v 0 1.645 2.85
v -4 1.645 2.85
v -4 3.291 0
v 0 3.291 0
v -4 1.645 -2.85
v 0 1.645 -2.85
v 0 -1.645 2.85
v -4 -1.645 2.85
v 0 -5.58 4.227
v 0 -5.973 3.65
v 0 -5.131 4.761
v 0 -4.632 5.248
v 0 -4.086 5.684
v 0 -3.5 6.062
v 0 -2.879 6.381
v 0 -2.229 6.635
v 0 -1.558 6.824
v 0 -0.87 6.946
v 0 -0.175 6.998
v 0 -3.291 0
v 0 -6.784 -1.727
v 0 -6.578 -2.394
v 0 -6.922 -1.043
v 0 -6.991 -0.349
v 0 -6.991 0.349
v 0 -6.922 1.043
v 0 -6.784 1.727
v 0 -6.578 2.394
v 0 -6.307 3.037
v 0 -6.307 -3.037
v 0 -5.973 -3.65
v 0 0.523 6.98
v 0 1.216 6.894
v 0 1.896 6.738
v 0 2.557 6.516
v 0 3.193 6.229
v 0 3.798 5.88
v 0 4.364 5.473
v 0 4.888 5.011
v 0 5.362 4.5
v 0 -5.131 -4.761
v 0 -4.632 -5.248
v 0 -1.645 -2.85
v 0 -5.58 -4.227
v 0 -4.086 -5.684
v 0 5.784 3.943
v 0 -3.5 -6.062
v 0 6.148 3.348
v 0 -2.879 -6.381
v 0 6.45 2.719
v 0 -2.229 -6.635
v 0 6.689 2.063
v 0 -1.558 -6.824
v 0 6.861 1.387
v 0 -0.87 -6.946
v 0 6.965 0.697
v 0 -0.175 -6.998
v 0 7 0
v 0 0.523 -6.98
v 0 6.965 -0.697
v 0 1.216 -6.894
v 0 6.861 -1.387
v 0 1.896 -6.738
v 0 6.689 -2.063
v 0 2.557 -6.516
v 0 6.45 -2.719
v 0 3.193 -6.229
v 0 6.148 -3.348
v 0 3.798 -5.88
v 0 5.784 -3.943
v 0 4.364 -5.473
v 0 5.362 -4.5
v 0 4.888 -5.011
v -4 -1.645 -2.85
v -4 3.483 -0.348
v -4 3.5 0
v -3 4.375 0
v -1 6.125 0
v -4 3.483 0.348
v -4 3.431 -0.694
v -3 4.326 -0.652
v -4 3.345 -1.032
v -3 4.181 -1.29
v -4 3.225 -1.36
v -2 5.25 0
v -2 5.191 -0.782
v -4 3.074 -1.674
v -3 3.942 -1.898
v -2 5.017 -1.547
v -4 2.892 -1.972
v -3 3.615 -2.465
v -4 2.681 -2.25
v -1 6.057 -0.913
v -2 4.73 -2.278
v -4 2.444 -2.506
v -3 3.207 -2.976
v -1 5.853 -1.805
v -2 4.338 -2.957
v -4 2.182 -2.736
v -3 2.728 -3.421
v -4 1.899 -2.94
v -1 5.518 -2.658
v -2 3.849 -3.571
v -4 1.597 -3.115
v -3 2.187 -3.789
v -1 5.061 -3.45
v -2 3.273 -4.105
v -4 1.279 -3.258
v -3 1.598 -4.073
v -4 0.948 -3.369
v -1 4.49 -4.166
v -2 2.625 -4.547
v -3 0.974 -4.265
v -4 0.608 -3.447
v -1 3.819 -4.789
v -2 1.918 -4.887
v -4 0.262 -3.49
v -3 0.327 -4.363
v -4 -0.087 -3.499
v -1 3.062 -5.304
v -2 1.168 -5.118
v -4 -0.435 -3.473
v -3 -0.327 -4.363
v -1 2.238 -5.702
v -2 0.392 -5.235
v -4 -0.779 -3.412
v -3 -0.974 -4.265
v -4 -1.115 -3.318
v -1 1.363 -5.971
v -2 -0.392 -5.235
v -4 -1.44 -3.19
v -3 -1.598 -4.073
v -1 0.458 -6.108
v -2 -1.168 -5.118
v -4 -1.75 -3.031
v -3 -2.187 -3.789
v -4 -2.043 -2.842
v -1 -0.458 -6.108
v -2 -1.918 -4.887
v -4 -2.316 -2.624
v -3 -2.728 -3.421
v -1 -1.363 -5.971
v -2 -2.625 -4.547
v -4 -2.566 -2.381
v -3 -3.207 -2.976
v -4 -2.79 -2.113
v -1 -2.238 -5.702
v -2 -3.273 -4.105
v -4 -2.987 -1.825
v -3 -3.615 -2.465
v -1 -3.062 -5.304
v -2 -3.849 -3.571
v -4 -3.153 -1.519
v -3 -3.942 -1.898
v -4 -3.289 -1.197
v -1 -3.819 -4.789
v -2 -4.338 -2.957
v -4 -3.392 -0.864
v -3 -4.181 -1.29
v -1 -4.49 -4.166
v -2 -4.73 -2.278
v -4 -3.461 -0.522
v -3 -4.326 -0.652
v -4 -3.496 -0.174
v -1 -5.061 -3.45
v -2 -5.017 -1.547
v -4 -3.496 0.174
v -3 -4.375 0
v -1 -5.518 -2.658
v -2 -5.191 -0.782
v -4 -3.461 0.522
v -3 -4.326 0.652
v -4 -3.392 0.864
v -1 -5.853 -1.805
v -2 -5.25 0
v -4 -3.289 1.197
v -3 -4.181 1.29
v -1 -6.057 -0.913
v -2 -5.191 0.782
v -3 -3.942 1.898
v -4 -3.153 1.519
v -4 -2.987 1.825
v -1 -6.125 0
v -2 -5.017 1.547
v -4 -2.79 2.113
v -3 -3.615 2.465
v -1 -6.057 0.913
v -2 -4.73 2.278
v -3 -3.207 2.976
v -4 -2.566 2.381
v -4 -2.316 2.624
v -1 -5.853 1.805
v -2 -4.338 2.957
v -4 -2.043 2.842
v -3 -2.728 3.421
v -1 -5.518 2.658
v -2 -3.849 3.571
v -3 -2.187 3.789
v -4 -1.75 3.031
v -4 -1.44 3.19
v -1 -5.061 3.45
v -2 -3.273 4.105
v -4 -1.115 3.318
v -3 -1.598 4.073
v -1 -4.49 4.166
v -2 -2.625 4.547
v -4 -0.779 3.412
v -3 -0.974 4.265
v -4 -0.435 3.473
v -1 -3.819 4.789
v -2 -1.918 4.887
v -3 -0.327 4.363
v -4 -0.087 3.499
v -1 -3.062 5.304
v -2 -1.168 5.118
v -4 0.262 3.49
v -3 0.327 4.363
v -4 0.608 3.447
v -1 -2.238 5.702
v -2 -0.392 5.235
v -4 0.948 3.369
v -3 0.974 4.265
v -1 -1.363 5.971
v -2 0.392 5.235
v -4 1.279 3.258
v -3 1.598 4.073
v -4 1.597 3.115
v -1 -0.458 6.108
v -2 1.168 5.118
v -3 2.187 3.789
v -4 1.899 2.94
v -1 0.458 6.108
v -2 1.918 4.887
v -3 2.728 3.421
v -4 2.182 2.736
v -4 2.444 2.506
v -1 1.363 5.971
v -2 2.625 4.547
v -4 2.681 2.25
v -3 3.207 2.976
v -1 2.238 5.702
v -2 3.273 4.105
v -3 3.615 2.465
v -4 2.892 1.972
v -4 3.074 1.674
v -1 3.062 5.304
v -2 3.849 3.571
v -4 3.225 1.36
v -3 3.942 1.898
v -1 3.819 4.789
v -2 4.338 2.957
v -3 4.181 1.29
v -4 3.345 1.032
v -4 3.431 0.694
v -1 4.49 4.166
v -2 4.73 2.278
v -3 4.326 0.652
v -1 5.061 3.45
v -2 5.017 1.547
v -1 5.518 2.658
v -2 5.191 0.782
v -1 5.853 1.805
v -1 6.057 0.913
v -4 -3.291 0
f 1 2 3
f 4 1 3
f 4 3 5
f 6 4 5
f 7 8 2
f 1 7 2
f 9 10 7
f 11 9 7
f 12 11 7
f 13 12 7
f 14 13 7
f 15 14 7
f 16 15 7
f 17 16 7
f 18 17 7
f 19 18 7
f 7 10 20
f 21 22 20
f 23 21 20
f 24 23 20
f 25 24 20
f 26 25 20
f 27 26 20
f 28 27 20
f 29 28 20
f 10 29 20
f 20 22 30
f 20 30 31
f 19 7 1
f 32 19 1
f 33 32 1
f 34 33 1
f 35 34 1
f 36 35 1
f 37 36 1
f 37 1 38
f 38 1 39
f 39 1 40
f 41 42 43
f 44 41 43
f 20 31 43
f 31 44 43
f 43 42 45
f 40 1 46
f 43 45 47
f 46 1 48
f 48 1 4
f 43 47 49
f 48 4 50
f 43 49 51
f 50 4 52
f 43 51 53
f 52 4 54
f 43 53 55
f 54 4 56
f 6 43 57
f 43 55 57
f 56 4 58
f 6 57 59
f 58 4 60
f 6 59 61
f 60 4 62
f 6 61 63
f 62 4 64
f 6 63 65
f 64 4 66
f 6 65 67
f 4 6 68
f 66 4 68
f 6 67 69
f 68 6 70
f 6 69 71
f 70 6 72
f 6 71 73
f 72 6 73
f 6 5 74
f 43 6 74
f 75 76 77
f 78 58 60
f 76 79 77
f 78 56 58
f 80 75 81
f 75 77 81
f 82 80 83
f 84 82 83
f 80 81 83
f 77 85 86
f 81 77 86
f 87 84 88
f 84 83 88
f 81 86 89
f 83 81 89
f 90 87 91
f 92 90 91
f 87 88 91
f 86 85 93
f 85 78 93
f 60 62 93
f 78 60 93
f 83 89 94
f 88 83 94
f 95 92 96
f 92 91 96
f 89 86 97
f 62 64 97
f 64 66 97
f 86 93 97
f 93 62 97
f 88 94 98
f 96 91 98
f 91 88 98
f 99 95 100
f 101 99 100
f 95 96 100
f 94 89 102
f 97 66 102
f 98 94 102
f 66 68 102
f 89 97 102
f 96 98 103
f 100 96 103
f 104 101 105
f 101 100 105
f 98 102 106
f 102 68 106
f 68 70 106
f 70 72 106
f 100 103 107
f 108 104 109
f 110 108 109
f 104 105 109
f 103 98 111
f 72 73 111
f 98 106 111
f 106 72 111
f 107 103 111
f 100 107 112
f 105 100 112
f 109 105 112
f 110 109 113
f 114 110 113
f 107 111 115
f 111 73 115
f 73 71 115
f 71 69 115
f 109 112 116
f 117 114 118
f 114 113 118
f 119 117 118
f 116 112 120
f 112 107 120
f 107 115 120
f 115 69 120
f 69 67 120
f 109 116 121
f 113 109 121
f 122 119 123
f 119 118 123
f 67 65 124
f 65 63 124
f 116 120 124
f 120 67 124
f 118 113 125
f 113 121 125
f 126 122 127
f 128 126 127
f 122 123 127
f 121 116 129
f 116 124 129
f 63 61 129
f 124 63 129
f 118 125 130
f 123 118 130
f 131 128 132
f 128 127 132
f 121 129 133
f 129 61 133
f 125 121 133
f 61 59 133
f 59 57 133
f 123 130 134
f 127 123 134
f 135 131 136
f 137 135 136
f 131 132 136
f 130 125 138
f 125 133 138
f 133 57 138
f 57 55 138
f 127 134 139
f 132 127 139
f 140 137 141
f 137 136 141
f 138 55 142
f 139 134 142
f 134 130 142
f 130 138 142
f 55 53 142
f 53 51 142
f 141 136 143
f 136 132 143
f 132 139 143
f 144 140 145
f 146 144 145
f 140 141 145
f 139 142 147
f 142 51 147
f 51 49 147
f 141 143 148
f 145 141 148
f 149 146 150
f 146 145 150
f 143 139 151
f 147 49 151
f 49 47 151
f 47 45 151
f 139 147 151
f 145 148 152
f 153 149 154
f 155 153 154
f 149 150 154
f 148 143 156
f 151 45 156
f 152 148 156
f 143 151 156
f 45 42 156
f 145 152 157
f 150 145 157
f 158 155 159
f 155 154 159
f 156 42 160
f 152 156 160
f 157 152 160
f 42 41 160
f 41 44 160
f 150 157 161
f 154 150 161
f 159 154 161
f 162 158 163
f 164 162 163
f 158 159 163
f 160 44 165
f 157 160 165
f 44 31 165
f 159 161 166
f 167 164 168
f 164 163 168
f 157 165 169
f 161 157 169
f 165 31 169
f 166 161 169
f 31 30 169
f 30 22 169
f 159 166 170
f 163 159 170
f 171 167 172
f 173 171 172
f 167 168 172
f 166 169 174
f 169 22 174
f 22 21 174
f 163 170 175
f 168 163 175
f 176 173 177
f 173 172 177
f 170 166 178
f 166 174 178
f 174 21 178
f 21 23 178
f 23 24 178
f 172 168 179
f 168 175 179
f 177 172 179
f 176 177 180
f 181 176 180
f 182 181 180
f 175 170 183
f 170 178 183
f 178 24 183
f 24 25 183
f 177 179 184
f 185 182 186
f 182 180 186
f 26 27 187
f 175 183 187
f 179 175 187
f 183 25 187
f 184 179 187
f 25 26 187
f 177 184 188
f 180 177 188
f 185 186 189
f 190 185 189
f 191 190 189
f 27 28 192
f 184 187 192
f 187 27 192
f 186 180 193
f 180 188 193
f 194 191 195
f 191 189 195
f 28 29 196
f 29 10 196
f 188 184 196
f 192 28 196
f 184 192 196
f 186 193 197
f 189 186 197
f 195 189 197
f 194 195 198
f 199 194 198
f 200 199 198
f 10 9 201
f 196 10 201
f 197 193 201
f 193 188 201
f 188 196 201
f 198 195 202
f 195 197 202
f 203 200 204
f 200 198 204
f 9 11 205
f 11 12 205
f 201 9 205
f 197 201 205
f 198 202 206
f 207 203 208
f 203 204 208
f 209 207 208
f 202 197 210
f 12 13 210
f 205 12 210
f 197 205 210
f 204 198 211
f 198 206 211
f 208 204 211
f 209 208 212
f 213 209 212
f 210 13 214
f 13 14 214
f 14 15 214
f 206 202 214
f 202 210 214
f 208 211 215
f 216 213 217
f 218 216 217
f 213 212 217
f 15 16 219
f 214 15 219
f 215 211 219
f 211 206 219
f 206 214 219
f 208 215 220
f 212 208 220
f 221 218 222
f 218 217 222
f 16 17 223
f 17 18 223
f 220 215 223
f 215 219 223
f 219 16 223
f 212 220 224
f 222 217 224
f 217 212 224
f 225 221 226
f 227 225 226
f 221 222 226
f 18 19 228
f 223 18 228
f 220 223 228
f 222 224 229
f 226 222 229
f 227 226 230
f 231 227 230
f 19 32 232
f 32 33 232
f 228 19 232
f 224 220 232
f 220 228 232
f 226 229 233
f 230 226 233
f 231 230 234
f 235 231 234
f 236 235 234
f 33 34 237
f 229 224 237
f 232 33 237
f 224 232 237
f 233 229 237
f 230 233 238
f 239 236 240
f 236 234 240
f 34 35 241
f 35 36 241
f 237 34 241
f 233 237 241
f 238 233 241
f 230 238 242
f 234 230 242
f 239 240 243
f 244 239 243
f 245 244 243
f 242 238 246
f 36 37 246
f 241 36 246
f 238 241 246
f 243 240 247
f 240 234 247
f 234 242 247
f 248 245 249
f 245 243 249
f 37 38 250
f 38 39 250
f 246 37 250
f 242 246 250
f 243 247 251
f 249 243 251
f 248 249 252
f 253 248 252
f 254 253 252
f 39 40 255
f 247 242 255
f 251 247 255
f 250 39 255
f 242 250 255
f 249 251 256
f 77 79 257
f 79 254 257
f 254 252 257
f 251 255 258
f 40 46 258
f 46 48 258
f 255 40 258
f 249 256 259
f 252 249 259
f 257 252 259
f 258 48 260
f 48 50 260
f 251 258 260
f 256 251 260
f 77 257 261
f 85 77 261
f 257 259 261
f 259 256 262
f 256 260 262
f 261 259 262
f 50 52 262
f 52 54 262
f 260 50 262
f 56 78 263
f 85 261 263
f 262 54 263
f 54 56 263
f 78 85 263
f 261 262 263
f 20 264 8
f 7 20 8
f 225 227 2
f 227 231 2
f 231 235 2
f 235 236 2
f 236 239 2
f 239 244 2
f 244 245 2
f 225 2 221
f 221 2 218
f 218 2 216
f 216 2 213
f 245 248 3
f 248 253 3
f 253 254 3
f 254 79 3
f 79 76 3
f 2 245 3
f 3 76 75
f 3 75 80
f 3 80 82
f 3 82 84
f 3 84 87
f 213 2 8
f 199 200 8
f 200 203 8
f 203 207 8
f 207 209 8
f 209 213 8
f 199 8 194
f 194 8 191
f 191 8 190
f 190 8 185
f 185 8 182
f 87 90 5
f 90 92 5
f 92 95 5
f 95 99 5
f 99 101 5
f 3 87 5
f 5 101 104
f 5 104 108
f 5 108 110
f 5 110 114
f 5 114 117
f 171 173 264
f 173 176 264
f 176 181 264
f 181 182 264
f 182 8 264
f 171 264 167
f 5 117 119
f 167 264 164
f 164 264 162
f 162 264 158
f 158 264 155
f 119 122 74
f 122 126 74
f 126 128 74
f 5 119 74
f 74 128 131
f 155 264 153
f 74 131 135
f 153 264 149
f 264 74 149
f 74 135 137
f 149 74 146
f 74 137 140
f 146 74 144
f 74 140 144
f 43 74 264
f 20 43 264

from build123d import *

# Parameters (mm, degrees)
CUT_EXTRUDE1_DEPTH = 11.677078252


with BuildPart() as part:
    # Sketch1 → Revolve1 (revolve)
    with BuildSketch(Plane.XY):
        Polygon((0, 0), (-4, 0), (-4, 3.5), (0, 7), align=None)
    revolve(axis=Axis((0, 0, 0), (-1, 0, 0)))

    # Sketch2 → Cut-Extrude1 (cut, through all)
    with BuildSketch(Plane.ZY.offset(4)):
        Polygon((0, 3.290896534), (-2.85, 1.645448267), (-2.85, -1.645448267), (0, -3.290896534), (2.85, -1.645448267), (2.85, 1.645448267), align=None)
    extrude(amount=-CUT_EXTRUDE1_DEPTH, mode=Mode.SUBTRACT)


solid = part.part
